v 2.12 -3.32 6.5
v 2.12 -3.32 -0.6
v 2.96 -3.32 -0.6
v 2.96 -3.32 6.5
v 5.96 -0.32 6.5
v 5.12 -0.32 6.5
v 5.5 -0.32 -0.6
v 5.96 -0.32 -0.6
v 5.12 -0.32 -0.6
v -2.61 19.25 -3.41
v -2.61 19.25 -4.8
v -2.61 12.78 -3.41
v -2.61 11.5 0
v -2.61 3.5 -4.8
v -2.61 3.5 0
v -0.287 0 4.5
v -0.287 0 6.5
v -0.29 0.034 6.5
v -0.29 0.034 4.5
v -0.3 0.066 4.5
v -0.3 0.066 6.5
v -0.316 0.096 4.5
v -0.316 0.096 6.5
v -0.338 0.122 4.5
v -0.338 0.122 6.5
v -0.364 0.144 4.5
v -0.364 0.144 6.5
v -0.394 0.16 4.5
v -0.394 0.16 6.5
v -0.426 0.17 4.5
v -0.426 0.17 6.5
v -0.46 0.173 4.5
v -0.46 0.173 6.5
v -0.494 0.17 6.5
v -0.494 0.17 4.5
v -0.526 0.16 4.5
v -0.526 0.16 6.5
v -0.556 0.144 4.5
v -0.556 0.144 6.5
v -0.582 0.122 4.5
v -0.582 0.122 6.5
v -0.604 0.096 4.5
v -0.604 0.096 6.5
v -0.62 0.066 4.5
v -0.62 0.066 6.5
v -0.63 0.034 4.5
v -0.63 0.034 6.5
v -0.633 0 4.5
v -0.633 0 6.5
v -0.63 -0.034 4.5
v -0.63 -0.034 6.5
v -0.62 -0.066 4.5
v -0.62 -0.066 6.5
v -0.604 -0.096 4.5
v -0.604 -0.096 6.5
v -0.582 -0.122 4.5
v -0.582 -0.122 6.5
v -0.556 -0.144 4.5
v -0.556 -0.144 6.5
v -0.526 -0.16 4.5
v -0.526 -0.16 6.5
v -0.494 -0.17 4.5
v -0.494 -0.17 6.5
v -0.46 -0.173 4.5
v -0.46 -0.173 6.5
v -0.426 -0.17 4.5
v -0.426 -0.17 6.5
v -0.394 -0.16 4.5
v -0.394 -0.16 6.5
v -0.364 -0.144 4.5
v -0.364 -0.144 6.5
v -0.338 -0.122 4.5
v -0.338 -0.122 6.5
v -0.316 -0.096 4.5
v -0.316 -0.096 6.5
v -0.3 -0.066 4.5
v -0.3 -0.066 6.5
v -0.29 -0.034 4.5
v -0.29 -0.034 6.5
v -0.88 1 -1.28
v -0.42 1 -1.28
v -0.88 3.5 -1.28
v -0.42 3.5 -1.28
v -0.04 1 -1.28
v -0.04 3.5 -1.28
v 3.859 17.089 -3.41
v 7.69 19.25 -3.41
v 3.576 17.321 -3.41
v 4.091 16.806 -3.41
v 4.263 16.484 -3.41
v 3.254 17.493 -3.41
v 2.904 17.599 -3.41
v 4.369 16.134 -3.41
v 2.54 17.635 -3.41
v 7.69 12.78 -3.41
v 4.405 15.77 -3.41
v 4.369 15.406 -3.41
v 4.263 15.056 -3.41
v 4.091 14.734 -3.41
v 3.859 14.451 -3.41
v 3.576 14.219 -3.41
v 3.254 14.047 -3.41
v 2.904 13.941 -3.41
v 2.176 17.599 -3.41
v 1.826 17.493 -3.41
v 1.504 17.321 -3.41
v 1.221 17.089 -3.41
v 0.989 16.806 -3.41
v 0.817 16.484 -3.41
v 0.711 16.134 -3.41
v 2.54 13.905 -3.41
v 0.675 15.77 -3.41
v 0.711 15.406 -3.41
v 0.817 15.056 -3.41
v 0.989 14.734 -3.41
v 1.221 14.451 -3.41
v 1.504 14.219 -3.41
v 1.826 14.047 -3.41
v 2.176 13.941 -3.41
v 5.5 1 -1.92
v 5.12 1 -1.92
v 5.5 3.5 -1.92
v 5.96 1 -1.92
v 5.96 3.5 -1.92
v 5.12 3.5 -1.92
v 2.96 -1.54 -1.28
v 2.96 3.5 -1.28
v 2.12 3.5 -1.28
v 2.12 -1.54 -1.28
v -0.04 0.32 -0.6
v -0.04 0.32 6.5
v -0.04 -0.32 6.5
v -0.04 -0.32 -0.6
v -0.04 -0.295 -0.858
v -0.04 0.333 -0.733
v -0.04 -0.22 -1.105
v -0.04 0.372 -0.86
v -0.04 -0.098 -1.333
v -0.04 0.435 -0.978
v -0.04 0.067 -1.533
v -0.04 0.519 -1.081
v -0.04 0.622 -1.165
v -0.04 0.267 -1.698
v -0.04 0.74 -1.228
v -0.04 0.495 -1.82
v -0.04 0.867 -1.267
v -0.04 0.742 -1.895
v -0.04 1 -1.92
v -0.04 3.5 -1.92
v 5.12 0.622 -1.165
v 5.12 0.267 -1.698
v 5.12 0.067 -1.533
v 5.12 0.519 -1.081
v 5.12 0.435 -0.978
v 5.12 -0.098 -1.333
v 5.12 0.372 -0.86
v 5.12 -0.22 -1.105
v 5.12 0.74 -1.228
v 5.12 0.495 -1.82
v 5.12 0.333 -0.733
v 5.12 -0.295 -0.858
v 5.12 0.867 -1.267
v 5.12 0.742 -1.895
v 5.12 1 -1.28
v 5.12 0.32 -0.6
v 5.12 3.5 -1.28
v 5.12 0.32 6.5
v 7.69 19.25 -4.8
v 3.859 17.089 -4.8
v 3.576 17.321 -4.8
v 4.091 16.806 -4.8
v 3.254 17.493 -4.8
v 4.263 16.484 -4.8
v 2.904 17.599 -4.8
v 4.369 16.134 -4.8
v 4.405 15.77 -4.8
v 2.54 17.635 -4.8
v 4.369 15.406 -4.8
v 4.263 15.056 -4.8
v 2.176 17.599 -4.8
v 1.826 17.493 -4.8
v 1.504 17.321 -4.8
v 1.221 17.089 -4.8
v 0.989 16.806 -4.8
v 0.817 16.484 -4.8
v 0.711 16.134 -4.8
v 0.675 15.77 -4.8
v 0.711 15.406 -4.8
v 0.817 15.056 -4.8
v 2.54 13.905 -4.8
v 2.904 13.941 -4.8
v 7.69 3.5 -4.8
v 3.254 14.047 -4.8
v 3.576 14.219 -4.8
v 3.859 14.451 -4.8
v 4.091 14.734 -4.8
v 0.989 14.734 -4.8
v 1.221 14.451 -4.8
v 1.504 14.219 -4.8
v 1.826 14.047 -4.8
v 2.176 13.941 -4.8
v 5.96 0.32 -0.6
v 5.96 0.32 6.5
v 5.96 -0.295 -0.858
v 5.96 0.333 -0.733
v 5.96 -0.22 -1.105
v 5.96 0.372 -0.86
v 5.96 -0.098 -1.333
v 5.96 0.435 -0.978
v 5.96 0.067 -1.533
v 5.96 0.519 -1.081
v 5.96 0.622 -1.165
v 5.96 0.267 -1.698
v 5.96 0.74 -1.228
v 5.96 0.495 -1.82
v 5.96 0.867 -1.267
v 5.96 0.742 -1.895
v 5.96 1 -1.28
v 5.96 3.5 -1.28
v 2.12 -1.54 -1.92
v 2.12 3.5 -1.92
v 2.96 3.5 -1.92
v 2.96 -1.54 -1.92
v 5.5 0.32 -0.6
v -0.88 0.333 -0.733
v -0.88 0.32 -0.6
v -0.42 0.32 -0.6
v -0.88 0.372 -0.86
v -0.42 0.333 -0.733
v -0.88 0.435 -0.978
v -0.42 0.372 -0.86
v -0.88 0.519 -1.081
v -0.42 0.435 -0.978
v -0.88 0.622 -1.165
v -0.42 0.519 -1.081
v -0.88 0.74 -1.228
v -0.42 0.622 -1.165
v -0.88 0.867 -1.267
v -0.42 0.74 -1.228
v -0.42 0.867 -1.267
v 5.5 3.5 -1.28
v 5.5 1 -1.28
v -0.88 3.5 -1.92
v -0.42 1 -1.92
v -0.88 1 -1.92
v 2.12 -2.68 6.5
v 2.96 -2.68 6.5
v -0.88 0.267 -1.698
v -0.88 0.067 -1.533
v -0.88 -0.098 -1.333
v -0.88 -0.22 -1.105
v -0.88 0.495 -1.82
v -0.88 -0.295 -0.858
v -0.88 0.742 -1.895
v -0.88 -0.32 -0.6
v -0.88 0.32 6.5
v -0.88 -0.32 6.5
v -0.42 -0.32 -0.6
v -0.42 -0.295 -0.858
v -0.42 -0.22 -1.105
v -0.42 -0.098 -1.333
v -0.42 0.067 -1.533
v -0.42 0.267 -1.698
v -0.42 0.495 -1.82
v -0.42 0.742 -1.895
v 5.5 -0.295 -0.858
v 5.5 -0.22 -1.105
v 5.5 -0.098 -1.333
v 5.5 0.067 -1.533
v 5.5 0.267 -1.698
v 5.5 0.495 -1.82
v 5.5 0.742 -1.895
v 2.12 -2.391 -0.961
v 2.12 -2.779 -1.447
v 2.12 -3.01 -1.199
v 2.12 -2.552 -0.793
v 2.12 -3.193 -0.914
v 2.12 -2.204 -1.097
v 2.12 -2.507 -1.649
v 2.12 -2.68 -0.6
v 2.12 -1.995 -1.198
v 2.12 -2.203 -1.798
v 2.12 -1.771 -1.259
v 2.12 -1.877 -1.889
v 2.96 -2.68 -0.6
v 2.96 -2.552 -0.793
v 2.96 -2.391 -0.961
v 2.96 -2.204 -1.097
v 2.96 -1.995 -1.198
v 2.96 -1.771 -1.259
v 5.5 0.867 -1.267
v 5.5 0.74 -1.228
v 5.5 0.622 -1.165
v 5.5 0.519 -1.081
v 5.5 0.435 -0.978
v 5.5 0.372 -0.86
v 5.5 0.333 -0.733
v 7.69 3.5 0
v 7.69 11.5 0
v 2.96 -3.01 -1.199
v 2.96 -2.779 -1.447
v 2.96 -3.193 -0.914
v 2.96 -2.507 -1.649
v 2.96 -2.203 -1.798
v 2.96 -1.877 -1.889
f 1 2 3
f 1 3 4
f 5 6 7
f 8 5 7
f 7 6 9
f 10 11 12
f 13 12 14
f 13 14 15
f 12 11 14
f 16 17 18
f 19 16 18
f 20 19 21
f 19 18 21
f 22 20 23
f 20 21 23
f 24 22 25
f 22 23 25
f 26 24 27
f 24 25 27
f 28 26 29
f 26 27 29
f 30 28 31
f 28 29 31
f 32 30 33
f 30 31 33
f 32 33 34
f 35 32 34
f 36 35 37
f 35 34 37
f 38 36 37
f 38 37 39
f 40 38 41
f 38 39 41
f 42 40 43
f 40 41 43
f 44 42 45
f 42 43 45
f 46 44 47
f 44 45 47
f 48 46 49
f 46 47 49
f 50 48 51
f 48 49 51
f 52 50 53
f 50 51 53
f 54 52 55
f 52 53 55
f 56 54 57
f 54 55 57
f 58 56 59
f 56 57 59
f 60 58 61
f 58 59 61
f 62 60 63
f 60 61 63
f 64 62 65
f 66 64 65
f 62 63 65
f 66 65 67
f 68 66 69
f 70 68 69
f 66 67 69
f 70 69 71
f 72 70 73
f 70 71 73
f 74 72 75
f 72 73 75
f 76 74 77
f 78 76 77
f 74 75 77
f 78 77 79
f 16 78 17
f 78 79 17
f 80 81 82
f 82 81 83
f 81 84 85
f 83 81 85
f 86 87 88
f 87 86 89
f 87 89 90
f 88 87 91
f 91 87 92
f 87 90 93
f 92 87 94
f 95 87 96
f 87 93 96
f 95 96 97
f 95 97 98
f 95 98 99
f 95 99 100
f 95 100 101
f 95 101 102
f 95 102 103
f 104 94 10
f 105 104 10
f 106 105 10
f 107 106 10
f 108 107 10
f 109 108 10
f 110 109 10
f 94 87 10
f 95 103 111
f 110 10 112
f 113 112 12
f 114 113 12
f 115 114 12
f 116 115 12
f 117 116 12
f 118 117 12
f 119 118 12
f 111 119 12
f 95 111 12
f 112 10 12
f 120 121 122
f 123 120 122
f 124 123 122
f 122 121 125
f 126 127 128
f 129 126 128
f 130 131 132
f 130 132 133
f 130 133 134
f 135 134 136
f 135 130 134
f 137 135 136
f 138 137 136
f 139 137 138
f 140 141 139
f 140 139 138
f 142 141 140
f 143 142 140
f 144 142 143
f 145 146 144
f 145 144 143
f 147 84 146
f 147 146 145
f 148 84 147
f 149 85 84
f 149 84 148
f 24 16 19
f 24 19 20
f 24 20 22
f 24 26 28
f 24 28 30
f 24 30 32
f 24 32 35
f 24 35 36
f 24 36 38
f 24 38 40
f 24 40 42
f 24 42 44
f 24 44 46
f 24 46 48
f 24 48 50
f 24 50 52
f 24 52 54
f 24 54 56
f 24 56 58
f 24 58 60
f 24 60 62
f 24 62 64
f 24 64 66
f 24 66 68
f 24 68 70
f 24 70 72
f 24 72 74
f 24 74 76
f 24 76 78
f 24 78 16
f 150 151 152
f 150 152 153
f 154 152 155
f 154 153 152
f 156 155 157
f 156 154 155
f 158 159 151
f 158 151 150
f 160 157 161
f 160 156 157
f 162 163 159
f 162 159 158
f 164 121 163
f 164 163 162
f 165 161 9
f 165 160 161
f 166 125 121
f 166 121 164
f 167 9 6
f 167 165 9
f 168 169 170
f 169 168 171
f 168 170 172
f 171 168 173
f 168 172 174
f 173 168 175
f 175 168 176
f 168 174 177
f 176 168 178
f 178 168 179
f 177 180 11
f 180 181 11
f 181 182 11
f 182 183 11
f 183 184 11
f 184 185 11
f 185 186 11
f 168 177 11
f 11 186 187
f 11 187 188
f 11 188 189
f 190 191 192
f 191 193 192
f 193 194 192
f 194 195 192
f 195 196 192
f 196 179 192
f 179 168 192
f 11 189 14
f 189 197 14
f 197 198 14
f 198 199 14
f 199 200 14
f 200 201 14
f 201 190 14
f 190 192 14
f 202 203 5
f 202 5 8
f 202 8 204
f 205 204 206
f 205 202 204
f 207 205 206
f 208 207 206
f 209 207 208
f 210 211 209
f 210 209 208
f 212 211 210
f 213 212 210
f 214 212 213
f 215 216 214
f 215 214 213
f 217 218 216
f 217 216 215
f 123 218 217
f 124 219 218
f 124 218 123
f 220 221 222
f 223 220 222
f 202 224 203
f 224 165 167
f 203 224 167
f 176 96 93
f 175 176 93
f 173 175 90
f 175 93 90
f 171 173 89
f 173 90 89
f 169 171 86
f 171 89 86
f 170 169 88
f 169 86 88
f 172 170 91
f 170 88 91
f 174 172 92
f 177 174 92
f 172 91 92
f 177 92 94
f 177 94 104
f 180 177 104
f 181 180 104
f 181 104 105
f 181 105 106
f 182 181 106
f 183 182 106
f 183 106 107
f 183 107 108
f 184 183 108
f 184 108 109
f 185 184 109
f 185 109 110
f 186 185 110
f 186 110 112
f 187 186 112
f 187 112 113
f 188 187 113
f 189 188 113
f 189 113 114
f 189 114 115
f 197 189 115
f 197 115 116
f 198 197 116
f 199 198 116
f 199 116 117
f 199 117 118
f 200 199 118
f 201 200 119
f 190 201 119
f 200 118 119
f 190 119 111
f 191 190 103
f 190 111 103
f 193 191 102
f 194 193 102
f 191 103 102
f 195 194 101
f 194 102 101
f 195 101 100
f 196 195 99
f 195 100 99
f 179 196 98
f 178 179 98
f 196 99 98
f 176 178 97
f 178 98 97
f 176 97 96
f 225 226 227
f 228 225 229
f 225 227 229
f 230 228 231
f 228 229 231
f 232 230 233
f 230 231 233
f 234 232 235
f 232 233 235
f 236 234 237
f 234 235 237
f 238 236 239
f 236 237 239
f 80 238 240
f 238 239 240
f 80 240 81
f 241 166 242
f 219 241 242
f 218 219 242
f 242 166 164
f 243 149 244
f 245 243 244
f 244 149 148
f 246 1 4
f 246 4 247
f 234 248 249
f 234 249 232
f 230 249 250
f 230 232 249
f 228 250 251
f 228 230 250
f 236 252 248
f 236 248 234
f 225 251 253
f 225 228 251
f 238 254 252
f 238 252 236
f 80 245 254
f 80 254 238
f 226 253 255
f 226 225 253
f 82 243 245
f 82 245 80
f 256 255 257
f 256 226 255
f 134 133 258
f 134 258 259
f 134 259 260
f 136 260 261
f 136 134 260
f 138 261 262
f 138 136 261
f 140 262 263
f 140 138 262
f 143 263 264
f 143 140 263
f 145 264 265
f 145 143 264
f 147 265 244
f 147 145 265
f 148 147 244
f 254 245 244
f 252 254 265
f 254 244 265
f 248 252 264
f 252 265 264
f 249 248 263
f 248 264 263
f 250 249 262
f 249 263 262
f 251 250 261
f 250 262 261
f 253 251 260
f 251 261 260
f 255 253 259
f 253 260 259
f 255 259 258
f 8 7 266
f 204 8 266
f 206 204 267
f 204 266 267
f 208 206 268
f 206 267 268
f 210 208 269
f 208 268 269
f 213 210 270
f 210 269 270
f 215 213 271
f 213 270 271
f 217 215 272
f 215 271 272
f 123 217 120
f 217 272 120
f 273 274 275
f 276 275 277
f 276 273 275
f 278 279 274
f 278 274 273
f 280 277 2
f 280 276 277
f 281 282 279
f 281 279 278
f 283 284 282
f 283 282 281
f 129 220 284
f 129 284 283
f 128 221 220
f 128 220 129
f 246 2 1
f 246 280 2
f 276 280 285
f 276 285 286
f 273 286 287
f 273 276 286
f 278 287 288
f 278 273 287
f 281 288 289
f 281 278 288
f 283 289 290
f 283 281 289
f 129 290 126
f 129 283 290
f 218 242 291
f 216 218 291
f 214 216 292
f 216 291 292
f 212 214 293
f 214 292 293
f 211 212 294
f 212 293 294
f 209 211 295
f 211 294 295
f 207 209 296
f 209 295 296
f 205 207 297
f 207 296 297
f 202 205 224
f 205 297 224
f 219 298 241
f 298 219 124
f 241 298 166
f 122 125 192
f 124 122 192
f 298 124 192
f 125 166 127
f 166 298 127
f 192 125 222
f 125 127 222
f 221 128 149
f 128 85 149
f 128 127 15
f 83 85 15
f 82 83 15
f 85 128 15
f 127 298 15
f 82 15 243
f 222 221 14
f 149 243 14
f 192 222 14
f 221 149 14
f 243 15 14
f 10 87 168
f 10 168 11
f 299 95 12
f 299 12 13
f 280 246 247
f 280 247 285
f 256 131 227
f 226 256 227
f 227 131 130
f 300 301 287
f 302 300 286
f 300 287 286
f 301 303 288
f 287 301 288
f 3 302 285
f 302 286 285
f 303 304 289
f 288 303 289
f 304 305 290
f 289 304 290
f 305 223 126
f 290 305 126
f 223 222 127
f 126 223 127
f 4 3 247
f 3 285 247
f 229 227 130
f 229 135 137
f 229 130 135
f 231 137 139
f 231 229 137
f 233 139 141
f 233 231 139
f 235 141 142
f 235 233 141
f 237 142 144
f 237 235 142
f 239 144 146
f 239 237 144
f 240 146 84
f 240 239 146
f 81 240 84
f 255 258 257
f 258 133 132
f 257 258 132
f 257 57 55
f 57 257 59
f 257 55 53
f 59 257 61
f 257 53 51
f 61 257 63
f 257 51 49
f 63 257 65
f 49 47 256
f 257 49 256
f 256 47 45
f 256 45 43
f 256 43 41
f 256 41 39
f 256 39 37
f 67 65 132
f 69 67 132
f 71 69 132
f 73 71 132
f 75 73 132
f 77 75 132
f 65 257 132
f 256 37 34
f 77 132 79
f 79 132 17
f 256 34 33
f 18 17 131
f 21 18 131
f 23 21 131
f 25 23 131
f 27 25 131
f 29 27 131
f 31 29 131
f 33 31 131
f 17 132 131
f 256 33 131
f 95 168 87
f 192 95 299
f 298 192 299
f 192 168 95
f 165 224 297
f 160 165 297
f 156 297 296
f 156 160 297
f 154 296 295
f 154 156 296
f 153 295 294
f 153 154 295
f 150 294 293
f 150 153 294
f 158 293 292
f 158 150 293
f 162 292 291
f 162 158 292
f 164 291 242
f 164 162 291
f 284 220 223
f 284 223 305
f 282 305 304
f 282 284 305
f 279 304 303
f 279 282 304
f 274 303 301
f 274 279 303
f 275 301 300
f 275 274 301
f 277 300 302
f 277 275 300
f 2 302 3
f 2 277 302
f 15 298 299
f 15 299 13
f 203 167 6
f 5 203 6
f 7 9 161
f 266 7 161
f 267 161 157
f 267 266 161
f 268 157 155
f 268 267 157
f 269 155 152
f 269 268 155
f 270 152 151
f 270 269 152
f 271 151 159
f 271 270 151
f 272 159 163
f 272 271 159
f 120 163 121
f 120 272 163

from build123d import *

# Parameters (mm, degrees)
SKETCH_5_W                      = 10.3
SKETCH_5_H                      = 4.8
EXTRUDE_1_DEPTH                 = 15.75
CUT_EXTRUDE_1_REACH             = 23.278
CUT_EXTRUDE_1_DIRECTION_2_REACH = 23.278
SKETCH_11_R                     = 1.865
CUT_EXTRUDE_2_DEPTH             = 4.8
SKETCH_3_W                      = 0.84
SKETCH_3_H                      = 0.64
SKETCH_4_W                      = 0.84
SKETCH_4_H                      = 0.64
SKETCH_3_3_W                    = 0.84
SKETCH_3_3_H                    = 0.64
EXTRUDE_2_DEPTH                 = 2.5
SKETCH_4_3_W                    = 0.84
SKETCH_4_3_H                    = 0.64
EXTRUDE_3_DEPTH                 = 2.5
SKETCH_12_W                     = 0.84
SKETCH_12_H                     = 0.64
EXTRUDE_4_DEPTH                 = 4
EXTRUDE_5_DEPTH                 = 0.46
EXTRUDE_6_DEPTH                 = 0.46
CUT_EXTRUDE_3_DEPTH             = 0.46
CUT_EXTRUDE_START               = -0.46
CUT_EXTRUDE_4_DEPTH             = 0.46
SKETCH_17_R                     = 0.172950306
CUT_EXTRUDE_5_DEPTH             = 2
SKETCH_18_W                     = 11.930877945
SKETCH_18_H                     = 3.370946467
CUT_EXTRUDE_6_DEPTH             = 2
EXTRUDE_7_DEPTH                 = 0.84


with BuildPart() as part:
    # Эскиз5 → Вытянуть1 (new body)
    with BuildSketch(Plane(origin=(0, 3.5, 0), x_dir=(-1, 0, 0), z_dir=(0, 1, 0))):
        with Locations((-2.54, -2.4)):
            Rectangle(SKETCH_5_W, SKETCH_5_H)
    extrude(amount=EXTRUDE_1_DEPTH)

    # Вырез-Вытянуть1: up to this face of the body (flat: up to its plane)
    cut_extrude_1_end = Plane(part.part.faces().sort_by_distance((-2.61, 11.375, -2.4))[0])
    # Эскиз10 → Вырез-Вытянуть1 (cut, up to the picked face)
    with BuildSketch(Plane(origin=(0, 0, 0), x_dir=(0, 0, -1), z_dir=(1, 0, 0)), mode=Mode.PRIVATE) as cut_extrude_1_sk1:
        Polygon((0, 19.25), (3.41, 19.25), (3.41, 12.78), (0, 11.5), align=None)
    cut_extrude_1_tool1 = split(extrude(cut_extrude_1_sk1.sketch, amount=-CUT_EXTRUDE_1_REACH, mode=Mode.PRIVATE), bisect_by=cut_extrude_1_end, keep=Keep.BOTH, mode=Mode.PRIVATE)
    add(cut_extrude_1_tool1.solids().sort_by(Axis((0, 15.685398, -1.653842), (-1, 0, 0)))[0], mode=Mode.SUBTRACT)

    # Вырез-Вытянуть1 direction 2: up to this face of the body (flat: up to its plane)
    cut_extrude_1_direction_2_end = Plane(part.part.faces().sort_by_distance((7.69, 11.375, -2.4))[0])
    # Эскиз10 → Вырез-Вытянуть1 direction 2 (cut, up to the picked face)
    with BuildSketch(Plane(origin=(0, 0, 0), x_dir=(0, 0, -1), z_dir=(1, 0, 0)), mode=Mode.PRIVATE) as cut_extrude_1_direction_2_sk1:
        Polygon((0, 19.25), (3.41, 19.25), (3.41, 12.78), (0, 11.5), align=None)
    cut_extrude_1_direction_2_tool1 = split(extrude(cut_extrude_1_direction_2_sk1.sketch, amount=CUT_EXTRUDE_1_DIRECTION_2_REACH, mode=Mode.PRIVATE), bisect_by=cut_extrude_1_direction_2_end, keep=Keep.BOTH, mode=Mode.PRIVATE)
    add(cut_extrude_1_direction_2_tool1.solids().sort_by(Axis((0, 15.685398, -1.653842), (1, 0, 0)))[0], mode=Mode.SUBTRACT)

    # Эскиз11 → Вырез-Вытянуть2 (cut)
    with BuildSketch(Plane.XY):
        with Locations((2.54, 15.77)):
            Circle(SKETCH_11_R)
    extrude(amount=-CUT_EXTRUDE_2_DEPTH, mode=Mode.SUBTRACT)

    # По траектории1: sweep along a path in Эскиз8
    with BuildLine(Plane(origin=(0, 0, 0), x_dir=(0, 0, -1), z_dir=(1, 0, 0))) as sweep_1_path:
        Line((0, 0), (0.6, 0))
        ThreePointArc((0.6, 0), (1.307106781, 0.292893219), (1.6, 1))
        Line((1.6, 1), (1.6, 3.5))
    # Эскиз3 → По траектории1 (sweep)
    with BuildSketch(Plane.XY):
        Rectangle(SKETCH_3_W, SKETCH_3_H)
        with Locations((5.08, 0)):
            Rectangle(SKETCH_3_W, SKETCH_3_H)
    sweep(path=sweep_1_path.line)

    # По траектории2: sweep along a path in Эскиз9
    with BuildLine(Plane(origin=(0, 0, 0), x_dir=(0, 0, -1), z_dir=(1, 0, 0))) as sweep_2_path:
        Line((0, -2.54), (0.6, -2.54))
        ThreePointArc((0.6, -2.54), (1.307106781, -2.247106781), (1.6, -1.54))
        Line((1.6, -1.54), (1.6, 4.77))
    # Эскиз4 → По траектории2 (sweep)
    with BuildSketch(Plane.XY):
        with Locations((2.54, -2.54)):
            Rectangle(SKETCH_4_W, SKETCH_4_H)
    sweep(path=sweep_2_path.line)

    # Эскиз3<3> → Вытянуть2 (add)
    with BuildSketch(Plane.XY):
        Rectangle(SKETCH_3_3_W, SKETCH_3_3_H)
        with Locations((5.08, 0)):
            Rectangle(SKETCH_3_3_W, SKETCH_3_3_H)
    extrude(amount=EXTRUDE_2_DEPTH)

    # Эскиз4<3> → Вытянуть3 (add)
    with BuildSketch(Plane.XY):
        with Locations((2.54, -2.54)):
            Rectangle(SKETCH_4_3_W, SKETCH_4_3_H)
    extrude(amount=EXTRUDE_3_DEPTH)

    # Эскиз12 → Вытянуть4 (add)
    with BuildSketch(Plane.XY.offset(2.5)):
        Rectangle(SKETCH_12_W, SKETCH_12_H)
        with Locations((5.08, 0)):
            Rectangle(SKETCH_12_W, SKETCH_12_H)
        with Locations((2.54, -2.54)):
            Rectangle(SKETCH_12_W, SKETCH_12_H)
    extrude(amount=EXTRUDE_4_DEPTH)

    # Эскиз13 → Вытянуть5 (add)
    with BuildSketch(Plane.ZY.offset(0.42)):
        with BuildLine():
            Line((-0.6, -0.32), (6.5, -0.32))
            Line((6.5, -0.32), (6.5, 0.32))
            Line((6.5, 0.32), (-0.6, 0.32))
            ThreePointArc((-0.6, 0.32), (-1.080832611, 0.519167389), (-1.28, 1))
            Line((-1.28, 1), (-1.28, 3.5))
            Line((-1.28, 3.5), (-1.92, 3.5))
            Line((-1.92, 3.5), (-1.92, 1))
            ThreePointArc((-1.92, 1), (-1.533380951, 0.066619049), (-0.6, -0.32))
        make_face()
    extrude(amount=EXTRUDE_5_DEPTH)

    # Эскиз14 → Вытянуть6 (add)
    with BuildSketch(Plane(origin=(5.5, 0, 0), x_dir=(0, 0, -1), z_dir=(1, 0, 0))):
        with BuildLine():
            Line((0.6, 0.32), (-6.5, 0.32))
            Line((-6.5, 0.32), (-6.5, -0.32))
            Line((-6.5, -0.32), (0.6, -0.32))
            ThreePointArc((0.6, -0.32), (1.533380951, 0.066619049), (1.92, 1))
            Line((1.92, 1), (1.92, 3.5))
            Line((1.92, 3.5), (1.28, 3.5))
            Line((1.28, 3.5), (1.28, 1))
            ThreePointArc((1.28, 1), (1.080832611, 0.519167389), (0.6, 0.32))
        make_face()
    extrude(amount=EXTRUDE_6_DEPTH)

    # Эскиз15 → Вырез-Вытянуть3 (cut)
    with BuildSketch(Plane.ZY.offset(-4.66)):
        with BuildLine():
            Line((-0.6, -0.32), (6.5, -0.32))
            Line((6.5, -0.32), (6.5, 0.32))
            Line((6.5, 0.32), (-0.6, 0.32))
            ThreePointArc((-0.6, 0.32), (-1.080832611, 0.519167389), (-1.28, 1))
            Line((-1.28, 1), (-1.28, 3.5))
            Line((-1.28, 3.5), (-1.92, 3.5))
            Line((-1.92, 3.5), (-1.92, 1))
            ThreePointArc((-1.92, 1), (-1.533380951, 0.066619049), (-0.6, -0.32))
        make_face()
    extrude(amount=-CUT_EXTRUDE_3_DEPTH, mode=Mode.SUBTRACT)

    # Эскиз16 → Вырез-Вытянуть4 (cut)
    with BuildSketch(Plane(origin=(0.42, 0, 0), x_dir=(0, 0, -1), z_dir=(1, 0, 0)).offset(CUT_EXTRUDE_START)):
        with BuildLine():
            Line((0.6, 0.32), (-6.5, 0.32))
            Line((-6.5, 0.32), (-6.5, -0.32))
            Line((-6.5, -0.32), (0.6, -0.32))
            ThreePointArc((0.6, -0.32), (1.533380951, 0.066619049), (1.92, 1))
            Line((1.92, 1), (1.92, 3.5))
            Line((1.92, 3.5), (1.28, 3.5))
            Line((1.28, 3.5), (1.28, 1))
            ThreePointArc((1.28, 1), (1.080832611, 0.519167389), (0.6, 0.32))
        make_face()
    extrude(amount=CUT_EXTRUDE_4_DEPTH, mode=Mode.SUBTRACT)

    # Эскиз17 → Вырез-Вытянуть5 (cut)
    with BuildSketch(Plane.XY.offset(6.5)):
        with Locations((-0.46, 0)):
            Circle(SKETCH_17_R)
    extrude(amount=-CUT_EXTRUDE_5_DEPTH, mode=Mode.SUBTRACT)

    # Эскиз18 → Вырез-Вытянуть6 (cut)
    with BuildSketch(Plane.ZY.offset(-2.12)):
        with Locations((2.005211992, -3.225473234)):
            Rectangle(SKETCH_18_W, SKETCH_18_H)
    extrude(amount=-CUT_EXTRUDE_6_DEPTH, mode=Mode.SUBTRACT)

    # Эскиз19 → Вытянуть7 (add)
    with BuildSketch(Plane.ZY.offset(-2.12)):
        with BuildLine():
            Line((-0.6, -3.32), (6.5, -3.32))
            Line((6.5, -3.32), (6.5, -2.68))
            Line((6.5, -2.68), (-0.6, -2.68))
            ThreePointArc((-0.6, -2.68), (-1.097088212, -2.20370174), (-1.28, -1.54))
            Line((-1.28, -1.54), (-1.92, -1.54))
            ThreePointArc((-1.92, -1.54), (-1.553991604, -2.648016245), (-0.6, -3.32))
        make_face()
    extrude(amount=-EXTRUDE_7_DEPTH)


solid = part.part
